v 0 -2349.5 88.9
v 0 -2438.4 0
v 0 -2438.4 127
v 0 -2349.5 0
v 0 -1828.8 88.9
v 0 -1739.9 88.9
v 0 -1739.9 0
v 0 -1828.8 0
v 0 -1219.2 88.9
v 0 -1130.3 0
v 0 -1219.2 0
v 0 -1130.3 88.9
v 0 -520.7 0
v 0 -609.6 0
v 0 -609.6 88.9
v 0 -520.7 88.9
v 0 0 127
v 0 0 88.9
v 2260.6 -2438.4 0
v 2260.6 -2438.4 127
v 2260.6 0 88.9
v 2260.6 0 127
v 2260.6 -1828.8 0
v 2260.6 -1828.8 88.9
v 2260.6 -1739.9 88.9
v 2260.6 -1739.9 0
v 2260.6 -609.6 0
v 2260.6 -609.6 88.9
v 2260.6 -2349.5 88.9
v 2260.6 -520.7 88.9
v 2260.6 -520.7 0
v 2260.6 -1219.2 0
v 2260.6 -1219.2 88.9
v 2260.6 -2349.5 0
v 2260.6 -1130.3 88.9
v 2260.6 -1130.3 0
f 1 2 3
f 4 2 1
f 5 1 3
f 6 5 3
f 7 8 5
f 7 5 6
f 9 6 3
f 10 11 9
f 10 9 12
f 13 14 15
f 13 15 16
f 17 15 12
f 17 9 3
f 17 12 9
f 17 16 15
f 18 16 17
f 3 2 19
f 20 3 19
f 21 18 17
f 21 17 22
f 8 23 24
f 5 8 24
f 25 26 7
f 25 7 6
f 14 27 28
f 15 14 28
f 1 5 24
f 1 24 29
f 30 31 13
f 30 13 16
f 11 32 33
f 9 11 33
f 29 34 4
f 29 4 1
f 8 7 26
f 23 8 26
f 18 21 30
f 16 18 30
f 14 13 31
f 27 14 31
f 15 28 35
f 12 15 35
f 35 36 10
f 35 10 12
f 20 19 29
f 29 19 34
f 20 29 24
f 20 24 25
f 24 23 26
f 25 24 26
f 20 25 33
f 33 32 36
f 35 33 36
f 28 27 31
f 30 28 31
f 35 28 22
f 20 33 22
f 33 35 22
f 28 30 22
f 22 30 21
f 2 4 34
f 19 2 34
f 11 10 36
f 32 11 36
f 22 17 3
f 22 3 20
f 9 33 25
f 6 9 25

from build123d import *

# Parameters (mm, degrees)
F0_W     = 2260.6
F0_H     = 2438.4
F1_DEPTH = 127
F2_W     = 520.7
F2_H     = 88.9
F3_DEPTH = 2260.601


with BuildPart() as f1:
    # F0 (on Top) → F1 (new body)
    with BuildSketch(Plane.XY):
        with Locations((1130.3, -1219.2)):
            Rectangle(F0_W, F0_H)
    extrude(amount=F1_DEPTH)

    # F2 (on face) → F3 (cut, through all)
    with BuildSketch(Plane(origin=(0, 0, 0), x_dir=(0, -1, 0), z_dir=(-1, 0, 0))):
        with Locations((260.35, 44.45)):
            Rectangle(F2_W, F2_H)
        with Locations((869.95, 44.45)):
            Rectangle(F2_W, F2_H)
        with Locations((1479.55, 44.45)):
            Rectangle(F2_W, F2_H)
        with Locations((2089.15, 44.45)):
            Rectangle(F2_W, F2_H)
    extrude(amount=-F3_DEPTH, mode=Mode.SUBTRACT)


solid = f1.part
